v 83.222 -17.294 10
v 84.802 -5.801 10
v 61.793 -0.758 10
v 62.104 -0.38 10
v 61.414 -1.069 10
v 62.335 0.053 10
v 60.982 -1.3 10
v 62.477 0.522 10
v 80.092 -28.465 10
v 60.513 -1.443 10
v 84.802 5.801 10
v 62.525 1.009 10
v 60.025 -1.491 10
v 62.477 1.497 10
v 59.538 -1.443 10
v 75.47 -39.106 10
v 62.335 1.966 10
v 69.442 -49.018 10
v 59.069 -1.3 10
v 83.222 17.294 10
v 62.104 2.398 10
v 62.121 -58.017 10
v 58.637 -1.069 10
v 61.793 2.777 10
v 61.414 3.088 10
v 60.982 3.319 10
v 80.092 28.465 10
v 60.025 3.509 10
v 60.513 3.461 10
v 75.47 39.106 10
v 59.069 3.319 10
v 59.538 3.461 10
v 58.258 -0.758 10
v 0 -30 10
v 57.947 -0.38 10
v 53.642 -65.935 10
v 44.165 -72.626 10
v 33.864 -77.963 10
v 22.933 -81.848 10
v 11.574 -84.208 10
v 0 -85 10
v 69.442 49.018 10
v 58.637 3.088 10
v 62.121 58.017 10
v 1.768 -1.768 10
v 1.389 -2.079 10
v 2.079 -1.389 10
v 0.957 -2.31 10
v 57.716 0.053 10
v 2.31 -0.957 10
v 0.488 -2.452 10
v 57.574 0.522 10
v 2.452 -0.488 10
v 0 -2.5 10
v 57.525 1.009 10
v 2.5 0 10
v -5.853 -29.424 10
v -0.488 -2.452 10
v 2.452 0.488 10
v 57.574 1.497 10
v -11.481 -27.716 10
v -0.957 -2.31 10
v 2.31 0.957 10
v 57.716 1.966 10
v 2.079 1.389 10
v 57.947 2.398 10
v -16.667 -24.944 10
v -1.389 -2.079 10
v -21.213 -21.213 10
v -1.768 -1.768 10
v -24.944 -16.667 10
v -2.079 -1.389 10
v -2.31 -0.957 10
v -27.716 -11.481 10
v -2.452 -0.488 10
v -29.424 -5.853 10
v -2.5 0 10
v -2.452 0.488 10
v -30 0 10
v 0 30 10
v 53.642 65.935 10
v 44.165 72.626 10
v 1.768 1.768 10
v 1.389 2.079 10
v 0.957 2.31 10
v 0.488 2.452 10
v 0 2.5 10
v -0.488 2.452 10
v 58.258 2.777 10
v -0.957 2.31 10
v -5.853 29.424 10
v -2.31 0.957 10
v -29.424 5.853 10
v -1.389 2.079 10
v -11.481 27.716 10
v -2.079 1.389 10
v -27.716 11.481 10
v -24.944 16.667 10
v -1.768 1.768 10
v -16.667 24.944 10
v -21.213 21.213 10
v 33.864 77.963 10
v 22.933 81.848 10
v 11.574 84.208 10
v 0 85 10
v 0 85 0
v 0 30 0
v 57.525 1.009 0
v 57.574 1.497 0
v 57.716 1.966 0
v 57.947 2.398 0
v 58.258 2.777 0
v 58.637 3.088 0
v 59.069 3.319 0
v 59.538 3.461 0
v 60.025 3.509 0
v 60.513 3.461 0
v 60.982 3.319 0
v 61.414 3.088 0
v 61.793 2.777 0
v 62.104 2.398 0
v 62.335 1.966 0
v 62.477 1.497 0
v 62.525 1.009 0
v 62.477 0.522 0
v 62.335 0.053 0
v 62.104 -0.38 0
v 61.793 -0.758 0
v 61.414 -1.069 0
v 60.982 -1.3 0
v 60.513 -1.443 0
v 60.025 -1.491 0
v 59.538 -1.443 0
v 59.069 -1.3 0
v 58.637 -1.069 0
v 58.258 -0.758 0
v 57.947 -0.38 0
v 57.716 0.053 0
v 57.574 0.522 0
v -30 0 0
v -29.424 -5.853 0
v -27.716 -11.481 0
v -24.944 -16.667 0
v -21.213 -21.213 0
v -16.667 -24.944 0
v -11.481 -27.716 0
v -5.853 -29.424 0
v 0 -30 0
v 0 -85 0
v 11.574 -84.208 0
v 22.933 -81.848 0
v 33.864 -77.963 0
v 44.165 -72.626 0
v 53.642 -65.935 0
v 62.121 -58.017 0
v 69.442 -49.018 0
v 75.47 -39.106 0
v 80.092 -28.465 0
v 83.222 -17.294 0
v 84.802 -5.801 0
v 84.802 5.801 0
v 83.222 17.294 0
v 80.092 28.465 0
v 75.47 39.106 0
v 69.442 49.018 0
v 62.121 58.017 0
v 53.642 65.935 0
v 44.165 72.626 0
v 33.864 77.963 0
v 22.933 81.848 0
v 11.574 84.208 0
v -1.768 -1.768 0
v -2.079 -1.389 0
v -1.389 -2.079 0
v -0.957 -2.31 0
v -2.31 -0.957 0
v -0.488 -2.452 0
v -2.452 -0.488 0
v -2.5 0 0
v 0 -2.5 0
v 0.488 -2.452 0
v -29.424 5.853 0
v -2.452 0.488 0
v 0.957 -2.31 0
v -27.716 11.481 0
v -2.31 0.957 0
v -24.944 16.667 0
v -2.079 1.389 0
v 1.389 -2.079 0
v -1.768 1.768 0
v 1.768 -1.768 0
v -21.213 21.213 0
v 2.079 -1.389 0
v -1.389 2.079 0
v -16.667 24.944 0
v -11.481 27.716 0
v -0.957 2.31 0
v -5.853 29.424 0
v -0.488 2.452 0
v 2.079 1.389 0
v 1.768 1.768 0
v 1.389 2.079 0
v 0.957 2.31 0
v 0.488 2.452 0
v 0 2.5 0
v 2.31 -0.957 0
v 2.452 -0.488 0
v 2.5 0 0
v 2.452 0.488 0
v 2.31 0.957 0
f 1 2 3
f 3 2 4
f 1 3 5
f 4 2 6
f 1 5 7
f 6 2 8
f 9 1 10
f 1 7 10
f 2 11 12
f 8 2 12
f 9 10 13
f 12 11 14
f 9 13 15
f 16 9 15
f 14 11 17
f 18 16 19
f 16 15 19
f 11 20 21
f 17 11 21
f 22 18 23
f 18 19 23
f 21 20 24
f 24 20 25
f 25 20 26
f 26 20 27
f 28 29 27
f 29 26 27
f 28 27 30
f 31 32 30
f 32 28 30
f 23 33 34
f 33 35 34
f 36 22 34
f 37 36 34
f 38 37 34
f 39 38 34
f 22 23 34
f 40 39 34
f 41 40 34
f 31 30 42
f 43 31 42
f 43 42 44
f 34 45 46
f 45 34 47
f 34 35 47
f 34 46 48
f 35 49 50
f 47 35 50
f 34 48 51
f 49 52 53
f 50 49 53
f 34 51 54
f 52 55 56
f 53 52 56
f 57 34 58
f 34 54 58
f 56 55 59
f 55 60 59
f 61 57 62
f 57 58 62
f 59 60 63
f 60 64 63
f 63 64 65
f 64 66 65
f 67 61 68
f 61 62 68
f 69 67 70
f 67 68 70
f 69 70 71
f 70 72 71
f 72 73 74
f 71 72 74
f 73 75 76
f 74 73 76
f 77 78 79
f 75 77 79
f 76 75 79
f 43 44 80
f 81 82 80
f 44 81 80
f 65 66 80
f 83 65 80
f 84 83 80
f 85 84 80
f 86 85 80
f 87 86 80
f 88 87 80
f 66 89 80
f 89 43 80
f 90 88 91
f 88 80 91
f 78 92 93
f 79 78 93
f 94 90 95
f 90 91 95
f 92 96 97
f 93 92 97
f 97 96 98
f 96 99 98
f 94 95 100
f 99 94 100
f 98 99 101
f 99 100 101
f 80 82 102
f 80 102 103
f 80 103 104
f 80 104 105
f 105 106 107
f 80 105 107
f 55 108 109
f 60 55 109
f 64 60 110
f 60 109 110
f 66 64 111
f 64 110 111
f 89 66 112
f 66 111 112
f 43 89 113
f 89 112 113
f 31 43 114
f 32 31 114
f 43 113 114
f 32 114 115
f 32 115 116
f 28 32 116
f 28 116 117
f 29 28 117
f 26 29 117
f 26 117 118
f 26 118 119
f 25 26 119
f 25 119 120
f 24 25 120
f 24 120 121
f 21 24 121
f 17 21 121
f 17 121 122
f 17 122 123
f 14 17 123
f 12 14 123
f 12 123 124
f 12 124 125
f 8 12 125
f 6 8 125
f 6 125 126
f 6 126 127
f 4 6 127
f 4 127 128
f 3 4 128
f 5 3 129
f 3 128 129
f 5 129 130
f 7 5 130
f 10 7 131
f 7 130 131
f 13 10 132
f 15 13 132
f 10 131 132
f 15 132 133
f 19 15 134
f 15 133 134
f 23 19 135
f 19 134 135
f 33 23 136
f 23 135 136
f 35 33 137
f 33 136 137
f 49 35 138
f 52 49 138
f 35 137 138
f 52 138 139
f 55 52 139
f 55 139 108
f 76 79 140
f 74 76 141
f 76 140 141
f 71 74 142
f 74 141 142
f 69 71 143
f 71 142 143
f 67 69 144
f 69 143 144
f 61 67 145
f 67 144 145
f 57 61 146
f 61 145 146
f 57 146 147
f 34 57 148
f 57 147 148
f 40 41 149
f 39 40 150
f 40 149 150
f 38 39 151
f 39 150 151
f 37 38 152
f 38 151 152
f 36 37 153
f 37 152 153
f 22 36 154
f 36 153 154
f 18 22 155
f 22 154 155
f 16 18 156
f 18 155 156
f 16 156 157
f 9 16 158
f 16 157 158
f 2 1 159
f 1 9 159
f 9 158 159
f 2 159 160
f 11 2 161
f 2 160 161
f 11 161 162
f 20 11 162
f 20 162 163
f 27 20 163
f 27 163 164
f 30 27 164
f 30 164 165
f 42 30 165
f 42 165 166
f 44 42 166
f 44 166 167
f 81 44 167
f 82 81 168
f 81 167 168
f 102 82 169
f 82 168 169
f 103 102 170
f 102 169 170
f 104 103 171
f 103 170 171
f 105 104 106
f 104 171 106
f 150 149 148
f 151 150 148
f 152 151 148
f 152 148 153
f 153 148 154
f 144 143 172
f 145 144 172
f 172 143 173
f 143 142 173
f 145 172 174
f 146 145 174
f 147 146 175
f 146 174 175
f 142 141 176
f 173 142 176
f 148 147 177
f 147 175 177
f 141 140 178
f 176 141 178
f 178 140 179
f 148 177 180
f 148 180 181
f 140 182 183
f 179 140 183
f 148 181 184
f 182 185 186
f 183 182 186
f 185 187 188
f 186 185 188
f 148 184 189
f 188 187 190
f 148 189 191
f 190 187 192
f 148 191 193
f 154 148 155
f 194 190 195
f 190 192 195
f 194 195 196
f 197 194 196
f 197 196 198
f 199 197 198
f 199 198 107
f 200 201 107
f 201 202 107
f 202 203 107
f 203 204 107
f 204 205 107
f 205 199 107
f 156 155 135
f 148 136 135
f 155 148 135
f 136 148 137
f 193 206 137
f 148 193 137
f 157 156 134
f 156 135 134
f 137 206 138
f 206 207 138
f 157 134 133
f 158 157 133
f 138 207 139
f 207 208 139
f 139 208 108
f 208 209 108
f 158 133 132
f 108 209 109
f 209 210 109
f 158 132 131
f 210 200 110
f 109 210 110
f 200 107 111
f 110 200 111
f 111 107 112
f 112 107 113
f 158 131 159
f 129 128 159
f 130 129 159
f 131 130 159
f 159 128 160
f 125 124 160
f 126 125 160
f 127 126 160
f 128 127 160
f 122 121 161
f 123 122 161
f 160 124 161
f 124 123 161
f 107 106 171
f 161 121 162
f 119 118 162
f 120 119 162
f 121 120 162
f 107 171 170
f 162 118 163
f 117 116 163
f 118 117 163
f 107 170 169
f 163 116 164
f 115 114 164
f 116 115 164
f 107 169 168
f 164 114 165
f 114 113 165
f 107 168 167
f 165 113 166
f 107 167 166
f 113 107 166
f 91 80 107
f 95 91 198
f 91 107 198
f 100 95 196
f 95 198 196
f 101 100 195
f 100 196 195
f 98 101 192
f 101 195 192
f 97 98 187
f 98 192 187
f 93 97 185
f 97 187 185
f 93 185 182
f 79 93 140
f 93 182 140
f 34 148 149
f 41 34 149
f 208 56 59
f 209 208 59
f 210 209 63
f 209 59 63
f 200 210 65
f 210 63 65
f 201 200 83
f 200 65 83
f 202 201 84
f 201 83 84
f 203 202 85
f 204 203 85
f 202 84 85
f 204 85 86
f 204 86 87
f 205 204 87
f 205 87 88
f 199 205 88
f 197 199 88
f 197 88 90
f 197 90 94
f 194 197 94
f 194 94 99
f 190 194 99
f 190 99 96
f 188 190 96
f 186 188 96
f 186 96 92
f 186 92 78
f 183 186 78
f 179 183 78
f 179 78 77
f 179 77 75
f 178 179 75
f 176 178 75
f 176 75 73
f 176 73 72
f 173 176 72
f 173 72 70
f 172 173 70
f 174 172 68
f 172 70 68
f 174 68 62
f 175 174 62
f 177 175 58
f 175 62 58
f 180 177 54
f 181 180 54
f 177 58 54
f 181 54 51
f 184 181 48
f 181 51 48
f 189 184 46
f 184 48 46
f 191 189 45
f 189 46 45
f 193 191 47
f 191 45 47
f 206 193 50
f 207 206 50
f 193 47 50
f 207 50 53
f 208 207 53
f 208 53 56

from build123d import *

# Parameters (mm, degrees)
SKETCH_1_R          = 85
EXTRUDE_1_DEPTH     = 10
SKETCH_2_R          = 2.5
CUT_EXTRUDE_1_DEPTH = 121.623380818
SKETCH_3_R          = 2.5
CUT_EXTRUDE_2_DEPTH = 121.623380818
CUT_EXTRUDE_3_DEPTH = 121.623380818
EXTRUDE_START       = -10
SKETCH_5_R          = 2.5
EXTRUDE_2_DEPTH     = 10


with BuildPart() as part:
    # 草图1 → 凸台-拉伸1 (new body)
    with BuildSketch(Plane.XY):
        Circle(SKETCH_1_R)
    extrude(amount=EXTRUDE_1_DEPTH)

    # 草图2 → 切除-拉伸1 (cut, through all)
    with BuildSketch(Plane.XY.offset(10)):
        Circle(SKETCH_2_R)
        with Locations((80, 0)):
            Circle(SKETCH_2_R)
    extrude(amount=-CUT_EXTRUDE_1_DEPTH, mode=Mode.SUBTRACT)

    # 草图3 → 切除-拉伸2 (cut, through all)
    with BuildSketch(Plane(origin=(0, 0, 0), x_dir=(-1, 0, 0), z_dir=(0, 0, -1))):
        with Locations((-60.025485081, 1.009333311)):
            Circle(SKETCH_3_R)
    extrude(amount=-CUT_EXTRUDE_2_DEPTH, mode=Mode.SUBTRACT)

    # 草图4 → 切除-拉伸3 (cut, through all)
    with BuildSketch(Plane(origin=(0, 0, 0), x_dir=(-1, 0, 0), z_dir=(0, 0, -1))):
        with BuildLine():
            ThreePointArc((85, 0), (60.104076401, 60.104076401), (0, 85))
            Line((0, 85), (0, 30))
            ThreePointArc((0, 30), (21.213203436, 21.213203436), (30, 0))
            ThreePointArc((30, 0), (21.213203436, -21.213203436), (0, -30))
            Line((0, -30), (0, -85))
            ThreePointArc((0, -85), (60.104076401, -60.104076401), (85, 0))
        make_face()
    extrude(amount=-CUT_EXTRUDE_3_DEPTH, mode=Mode.SUBTRACT)

    # 草图5 → 凸台-拉伸2 (add)
    with BuildSketch(Plane(origin=(0, 0, 0), x_dir=(-1, 0, 0), z_dir=(0, 0, -1)).offset(EXTRUDE_START)):
        with Locations((-80, 0)):
            Circle(SKETCH_5_R)
    extrude(amount=EXTRUDE_2_DEPTH)


solid = part.part
